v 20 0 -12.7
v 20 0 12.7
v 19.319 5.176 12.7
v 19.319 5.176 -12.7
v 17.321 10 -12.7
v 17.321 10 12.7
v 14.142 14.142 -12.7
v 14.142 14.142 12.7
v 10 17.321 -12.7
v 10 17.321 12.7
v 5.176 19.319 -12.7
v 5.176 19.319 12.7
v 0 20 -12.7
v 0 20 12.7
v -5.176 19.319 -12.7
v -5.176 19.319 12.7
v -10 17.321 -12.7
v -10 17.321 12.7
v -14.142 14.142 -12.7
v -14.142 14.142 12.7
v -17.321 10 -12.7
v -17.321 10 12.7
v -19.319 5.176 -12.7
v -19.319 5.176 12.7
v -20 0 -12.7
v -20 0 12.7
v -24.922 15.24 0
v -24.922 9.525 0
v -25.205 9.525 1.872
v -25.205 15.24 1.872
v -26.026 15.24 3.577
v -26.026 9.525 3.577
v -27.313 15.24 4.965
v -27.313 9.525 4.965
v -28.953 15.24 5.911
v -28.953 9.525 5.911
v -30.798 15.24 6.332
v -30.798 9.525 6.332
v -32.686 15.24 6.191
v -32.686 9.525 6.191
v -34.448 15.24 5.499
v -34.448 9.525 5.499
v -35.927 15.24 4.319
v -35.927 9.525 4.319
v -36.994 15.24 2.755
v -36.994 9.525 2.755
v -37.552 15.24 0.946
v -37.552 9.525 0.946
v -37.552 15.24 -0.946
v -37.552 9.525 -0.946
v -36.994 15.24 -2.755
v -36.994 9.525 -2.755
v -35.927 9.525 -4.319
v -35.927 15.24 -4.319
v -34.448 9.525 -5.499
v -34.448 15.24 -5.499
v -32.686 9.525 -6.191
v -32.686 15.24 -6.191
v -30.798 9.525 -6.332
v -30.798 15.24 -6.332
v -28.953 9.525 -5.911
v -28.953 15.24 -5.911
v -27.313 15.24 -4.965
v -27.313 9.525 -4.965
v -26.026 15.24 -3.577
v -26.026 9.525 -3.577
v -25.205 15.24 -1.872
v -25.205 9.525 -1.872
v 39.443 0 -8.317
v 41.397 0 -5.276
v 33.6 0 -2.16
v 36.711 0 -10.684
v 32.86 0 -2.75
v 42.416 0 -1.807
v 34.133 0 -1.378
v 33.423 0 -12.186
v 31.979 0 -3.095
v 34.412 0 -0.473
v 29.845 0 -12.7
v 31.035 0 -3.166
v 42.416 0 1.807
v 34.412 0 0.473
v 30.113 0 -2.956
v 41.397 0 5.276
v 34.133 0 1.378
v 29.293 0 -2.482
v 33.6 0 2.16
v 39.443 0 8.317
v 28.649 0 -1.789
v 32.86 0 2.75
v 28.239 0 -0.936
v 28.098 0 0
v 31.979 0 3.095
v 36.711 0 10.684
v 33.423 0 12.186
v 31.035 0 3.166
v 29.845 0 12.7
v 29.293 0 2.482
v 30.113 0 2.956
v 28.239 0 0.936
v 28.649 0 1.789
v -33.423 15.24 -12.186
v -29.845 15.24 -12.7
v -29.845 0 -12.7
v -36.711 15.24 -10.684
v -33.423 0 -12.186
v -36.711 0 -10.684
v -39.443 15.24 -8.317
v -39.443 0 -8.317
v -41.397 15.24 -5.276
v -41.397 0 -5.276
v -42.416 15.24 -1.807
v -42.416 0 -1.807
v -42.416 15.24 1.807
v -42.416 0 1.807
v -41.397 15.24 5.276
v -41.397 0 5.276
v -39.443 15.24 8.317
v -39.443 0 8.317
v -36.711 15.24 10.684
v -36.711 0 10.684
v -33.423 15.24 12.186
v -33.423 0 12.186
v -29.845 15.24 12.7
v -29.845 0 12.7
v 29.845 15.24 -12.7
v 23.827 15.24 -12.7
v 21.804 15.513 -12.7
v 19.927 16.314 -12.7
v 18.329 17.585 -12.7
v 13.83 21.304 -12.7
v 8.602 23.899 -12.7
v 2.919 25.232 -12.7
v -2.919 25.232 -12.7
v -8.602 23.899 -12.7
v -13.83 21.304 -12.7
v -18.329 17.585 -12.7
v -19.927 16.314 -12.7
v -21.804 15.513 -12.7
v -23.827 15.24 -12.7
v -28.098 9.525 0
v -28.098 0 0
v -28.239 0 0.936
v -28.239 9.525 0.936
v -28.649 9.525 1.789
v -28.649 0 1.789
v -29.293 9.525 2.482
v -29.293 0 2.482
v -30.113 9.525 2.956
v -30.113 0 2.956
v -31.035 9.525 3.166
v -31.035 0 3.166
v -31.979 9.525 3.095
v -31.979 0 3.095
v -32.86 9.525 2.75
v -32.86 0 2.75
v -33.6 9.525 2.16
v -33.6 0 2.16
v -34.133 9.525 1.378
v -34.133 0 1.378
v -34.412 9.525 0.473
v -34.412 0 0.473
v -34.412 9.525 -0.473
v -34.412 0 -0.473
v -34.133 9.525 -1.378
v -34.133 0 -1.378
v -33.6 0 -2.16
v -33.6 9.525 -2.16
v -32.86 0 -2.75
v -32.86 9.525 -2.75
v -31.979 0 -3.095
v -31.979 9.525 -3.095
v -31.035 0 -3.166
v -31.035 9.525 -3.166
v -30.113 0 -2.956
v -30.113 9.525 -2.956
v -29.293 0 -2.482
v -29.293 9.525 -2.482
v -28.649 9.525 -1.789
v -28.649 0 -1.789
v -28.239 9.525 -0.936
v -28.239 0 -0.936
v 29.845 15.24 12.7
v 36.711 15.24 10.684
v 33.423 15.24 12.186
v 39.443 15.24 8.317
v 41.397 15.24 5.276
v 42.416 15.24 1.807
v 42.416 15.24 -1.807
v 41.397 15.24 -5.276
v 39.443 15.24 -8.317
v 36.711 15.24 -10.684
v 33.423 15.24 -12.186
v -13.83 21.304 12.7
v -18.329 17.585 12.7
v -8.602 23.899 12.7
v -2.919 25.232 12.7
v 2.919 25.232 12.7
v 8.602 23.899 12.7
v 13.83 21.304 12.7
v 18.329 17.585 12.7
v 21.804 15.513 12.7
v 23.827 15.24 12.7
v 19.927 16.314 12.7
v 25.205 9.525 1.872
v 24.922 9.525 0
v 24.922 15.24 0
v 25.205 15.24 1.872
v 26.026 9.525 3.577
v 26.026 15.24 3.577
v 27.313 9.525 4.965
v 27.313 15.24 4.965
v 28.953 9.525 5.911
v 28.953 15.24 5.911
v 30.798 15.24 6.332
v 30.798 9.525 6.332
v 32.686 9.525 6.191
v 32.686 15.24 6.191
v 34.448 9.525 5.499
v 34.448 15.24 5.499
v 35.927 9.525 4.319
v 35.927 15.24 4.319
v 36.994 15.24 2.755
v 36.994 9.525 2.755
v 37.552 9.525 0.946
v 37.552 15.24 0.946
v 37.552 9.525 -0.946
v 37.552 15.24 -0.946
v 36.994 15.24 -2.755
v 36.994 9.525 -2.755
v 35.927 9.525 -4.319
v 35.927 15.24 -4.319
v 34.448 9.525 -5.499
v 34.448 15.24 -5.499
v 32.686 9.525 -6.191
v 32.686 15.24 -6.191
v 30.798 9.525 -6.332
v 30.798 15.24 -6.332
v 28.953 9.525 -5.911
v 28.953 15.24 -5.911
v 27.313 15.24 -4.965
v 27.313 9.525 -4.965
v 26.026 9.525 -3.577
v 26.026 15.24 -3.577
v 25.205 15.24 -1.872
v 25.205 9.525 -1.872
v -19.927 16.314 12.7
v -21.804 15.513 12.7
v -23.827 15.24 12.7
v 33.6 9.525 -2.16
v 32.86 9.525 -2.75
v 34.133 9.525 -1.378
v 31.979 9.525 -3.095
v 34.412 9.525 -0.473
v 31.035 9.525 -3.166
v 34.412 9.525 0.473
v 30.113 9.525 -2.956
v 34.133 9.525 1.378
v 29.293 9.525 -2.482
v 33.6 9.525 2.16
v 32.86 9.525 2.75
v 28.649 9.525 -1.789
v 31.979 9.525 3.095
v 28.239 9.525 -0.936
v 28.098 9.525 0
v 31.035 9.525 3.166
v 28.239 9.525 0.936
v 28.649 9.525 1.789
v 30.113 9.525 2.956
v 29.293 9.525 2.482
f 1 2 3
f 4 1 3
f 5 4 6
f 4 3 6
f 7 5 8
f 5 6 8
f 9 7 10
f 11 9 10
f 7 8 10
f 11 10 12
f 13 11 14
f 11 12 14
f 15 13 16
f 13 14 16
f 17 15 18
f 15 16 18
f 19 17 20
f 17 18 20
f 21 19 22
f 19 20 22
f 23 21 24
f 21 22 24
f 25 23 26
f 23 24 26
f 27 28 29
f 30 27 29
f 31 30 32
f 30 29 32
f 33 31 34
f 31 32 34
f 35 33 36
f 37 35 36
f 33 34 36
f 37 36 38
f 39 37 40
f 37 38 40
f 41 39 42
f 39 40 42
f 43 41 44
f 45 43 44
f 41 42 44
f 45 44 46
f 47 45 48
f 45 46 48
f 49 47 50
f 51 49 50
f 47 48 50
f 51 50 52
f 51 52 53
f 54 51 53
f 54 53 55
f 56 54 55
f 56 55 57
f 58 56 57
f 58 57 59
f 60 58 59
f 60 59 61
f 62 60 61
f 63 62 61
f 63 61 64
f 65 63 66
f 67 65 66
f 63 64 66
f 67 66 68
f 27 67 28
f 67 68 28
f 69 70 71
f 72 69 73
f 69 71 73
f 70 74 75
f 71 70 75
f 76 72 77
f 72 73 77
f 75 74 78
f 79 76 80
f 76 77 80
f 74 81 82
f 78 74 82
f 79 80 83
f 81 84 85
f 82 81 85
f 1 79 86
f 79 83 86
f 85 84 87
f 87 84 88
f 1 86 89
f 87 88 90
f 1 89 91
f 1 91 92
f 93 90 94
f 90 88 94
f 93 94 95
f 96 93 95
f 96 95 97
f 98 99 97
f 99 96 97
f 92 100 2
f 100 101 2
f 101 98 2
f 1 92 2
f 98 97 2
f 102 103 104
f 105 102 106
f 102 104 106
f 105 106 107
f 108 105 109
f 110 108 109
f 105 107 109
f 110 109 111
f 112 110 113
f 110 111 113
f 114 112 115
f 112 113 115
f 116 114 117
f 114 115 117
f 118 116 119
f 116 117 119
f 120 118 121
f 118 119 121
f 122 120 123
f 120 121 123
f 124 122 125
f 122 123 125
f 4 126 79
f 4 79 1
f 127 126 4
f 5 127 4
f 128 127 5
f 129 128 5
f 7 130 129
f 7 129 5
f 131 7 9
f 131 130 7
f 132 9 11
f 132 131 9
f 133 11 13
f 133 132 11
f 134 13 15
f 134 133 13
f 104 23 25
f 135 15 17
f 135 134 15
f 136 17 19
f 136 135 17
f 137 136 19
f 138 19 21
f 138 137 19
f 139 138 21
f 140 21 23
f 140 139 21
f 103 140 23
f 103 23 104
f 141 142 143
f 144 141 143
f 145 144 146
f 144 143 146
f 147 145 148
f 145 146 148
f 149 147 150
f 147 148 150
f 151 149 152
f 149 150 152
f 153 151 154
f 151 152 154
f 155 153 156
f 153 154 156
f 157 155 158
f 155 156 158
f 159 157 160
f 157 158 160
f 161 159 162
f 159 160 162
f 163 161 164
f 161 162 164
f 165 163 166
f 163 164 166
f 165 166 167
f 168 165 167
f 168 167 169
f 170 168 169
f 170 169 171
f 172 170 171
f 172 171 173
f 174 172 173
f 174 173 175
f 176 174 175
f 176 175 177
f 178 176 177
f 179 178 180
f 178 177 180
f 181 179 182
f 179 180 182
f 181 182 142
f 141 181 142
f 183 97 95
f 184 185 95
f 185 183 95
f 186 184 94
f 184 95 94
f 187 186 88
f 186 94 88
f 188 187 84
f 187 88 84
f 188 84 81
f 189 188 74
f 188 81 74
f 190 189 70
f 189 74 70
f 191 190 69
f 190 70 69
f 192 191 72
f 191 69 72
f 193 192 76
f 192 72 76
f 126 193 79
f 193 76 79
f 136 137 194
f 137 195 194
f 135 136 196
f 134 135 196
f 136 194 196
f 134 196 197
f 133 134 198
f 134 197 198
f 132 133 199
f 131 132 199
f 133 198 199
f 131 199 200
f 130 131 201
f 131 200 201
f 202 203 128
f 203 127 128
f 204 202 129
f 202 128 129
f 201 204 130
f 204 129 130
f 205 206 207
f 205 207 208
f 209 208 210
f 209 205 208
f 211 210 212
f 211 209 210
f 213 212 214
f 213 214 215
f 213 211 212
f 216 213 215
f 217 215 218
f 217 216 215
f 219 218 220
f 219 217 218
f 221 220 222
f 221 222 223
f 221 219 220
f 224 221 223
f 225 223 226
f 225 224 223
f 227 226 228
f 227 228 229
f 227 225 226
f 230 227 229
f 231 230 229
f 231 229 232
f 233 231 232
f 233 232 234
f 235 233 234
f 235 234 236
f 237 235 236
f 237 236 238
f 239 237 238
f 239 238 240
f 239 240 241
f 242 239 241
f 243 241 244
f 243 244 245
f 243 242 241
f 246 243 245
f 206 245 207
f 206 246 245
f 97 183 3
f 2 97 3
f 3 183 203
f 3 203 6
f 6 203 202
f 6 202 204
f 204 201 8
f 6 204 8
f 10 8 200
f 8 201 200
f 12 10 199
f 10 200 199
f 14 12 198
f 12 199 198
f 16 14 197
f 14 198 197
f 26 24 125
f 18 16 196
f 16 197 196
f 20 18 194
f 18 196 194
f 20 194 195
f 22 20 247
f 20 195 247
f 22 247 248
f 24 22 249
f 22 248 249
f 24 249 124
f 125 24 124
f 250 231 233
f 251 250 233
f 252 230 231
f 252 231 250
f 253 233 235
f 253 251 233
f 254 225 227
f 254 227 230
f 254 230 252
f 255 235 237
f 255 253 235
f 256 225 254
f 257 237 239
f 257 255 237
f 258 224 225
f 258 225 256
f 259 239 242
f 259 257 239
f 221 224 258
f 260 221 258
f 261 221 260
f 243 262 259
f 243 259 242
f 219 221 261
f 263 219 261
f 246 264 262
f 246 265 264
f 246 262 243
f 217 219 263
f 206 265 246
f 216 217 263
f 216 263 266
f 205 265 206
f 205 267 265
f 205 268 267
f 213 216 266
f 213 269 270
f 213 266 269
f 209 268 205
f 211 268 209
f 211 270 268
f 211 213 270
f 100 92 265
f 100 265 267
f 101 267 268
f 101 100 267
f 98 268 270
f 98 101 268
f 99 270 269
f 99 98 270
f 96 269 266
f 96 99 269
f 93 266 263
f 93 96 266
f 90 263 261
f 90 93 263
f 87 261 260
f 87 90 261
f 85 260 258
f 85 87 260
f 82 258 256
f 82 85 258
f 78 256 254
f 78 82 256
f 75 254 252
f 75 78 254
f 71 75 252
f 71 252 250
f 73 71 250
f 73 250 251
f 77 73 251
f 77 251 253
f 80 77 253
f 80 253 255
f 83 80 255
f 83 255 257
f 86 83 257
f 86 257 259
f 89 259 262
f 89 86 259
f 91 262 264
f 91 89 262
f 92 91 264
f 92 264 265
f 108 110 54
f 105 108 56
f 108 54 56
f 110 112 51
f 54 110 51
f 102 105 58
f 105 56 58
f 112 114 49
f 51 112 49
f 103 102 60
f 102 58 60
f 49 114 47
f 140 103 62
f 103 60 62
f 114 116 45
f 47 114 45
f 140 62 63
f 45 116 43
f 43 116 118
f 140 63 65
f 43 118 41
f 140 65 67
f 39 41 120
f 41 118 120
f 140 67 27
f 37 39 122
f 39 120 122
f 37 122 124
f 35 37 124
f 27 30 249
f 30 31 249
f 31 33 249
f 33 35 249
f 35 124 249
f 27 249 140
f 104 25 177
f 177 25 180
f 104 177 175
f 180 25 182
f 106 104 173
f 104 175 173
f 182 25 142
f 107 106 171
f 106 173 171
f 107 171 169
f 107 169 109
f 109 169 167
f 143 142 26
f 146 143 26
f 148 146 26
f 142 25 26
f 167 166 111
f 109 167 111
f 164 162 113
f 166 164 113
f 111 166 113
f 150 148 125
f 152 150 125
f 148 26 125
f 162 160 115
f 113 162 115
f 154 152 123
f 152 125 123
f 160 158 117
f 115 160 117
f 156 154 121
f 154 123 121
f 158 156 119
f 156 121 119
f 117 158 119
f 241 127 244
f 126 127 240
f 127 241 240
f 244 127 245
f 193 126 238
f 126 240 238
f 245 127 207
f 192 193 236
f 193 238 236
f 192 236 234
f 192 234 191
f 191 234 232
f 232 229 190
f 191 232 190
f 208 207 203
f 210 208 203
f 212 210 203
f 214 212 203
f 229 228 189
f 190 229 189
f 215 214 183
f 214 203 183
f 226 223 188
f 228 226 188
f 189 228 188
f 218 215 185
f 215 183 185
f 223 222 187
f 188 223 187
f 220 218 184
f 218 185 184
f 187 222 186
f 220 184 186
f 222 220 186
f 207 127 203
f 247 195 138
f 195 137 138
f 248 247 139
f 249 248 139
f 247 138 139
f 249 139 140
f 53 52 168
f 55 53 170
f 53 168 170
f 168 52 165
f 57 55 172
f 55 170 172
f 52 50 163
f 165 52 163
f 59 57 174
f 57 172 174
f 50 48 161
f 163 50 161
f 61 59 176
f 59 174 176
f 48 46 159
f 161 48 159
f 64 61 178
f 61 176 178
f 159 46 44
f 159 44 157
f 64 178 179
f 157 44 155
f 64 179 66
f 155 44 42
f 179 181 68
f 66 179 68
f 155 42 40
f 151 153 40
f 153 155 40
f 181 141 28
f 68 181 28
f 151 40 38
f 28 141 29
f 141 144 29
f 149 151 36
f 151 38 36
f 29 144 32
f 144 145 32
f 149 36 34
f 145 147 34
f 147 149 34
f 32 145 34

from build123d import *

# Parameters (mm, degrees)
BOSS_EXTRUDE1_DEPTH = 12.7
FILLET1_R           = 7.62
FILLET2_R           = 7.62
SKETCH2_R           = 3.175
CUT_EXTRUDE1_DEPTH  = 9.525
SKETCH3_R           = 6.35
CUT_EXTRUDE2_DEPTH  = 5.715
SKETCH4_OUTSIDE_W   = 105.562
SKETCH4_OUTSIDE_H   = 45.872
CUT_EXTRUDE3_DEPTH  = 26.4


with BuildPart() as part:
    # Sketch1 → Boss-Extrude1 (new body, symmetric)
    with BuildSketch(Plane.XY):
        with BuildLine():
            Line((-42.545, 0), (-42.545, 15.24))
            Line((-42.545, 15.24), (-20.32, 15.24))
            ThreePointArc((-20.32, 15.24), (0, 25.4), (20.32, 15.24))
            Line((20.32, 15.24), (42.545, 15.24))
            Line((42.545, 15.24), (42.545, 0))
            Line((42.545, 0), (20, 0))
            ThreePointArc((20, 0), (0, 20), (-20, 0))
            Line((-20, 0), (-42.545, 0))
        make_face()
    extrude(amount=BOSS_EXTRUDE1_DEPTH, both=True)

    # Fillet1
    fillet1_edges = [part.edges().sort_by_distance(p)[0] for p in [
        (20.32, 15.24, 0),
    ]]
    fillet(fillet1_edges, radius=FILLET1_R)

    # Fillet2
    fillet2_edges = [part.edges().sort_by_distance(p)[0] for p in [
        (-20.32, 15.24, 0),
    ]]
    fillet(fillet2_edges, radius=FILLET2_R)

    # Sketch2 → Cut-Extrude1 (cut)
    with BuildSketch(Plane.XZ):
        with Locations((-31.2725, 0)):
            Circle(SKETCH2_R)
    cut_extrude1 = extrude(amount=-CUT_EXTRUDE1_DEPTH, mode=Mode.SUBTRACT)

    # Sketch3 → Cut-Extrude2 (cut)
    with BuildSketch(Plane.XZ.offset(-9.525)):
        with Locations((-31.2725, 0)):
            Circle(SKETCH3_R)
    cut_extrude2 = extrude(amount=-CUT_EXTRUDE2_DEPTH, mode=Mode.SUBTRACT)

    # Mirror1: Cut-Extrude1, Cut-Extrude2 across plane
    add(cut_extrude1.mirror(Plane(origin=(0, 0, 0), x_dir=(0, 0, 1), z_dir=(1, 0, 0))), mode=Mode.SUBTRACT)
    add(cut_extrude2.mirror(Plane(origin=(0, 0, 0), x_dir=(0, 0, 1), z_dir=(1, 0, 0))), mode=Mode.SUBTRACT)

    # Sketch4 outside → Cut-Extrude3 (cut, through all)
    with BuildSketch(Plane(origin=(0, 0, 0), x_dir=(1, 0, 0), z_dir=(0, 1, 0))):
        Rectangle(SKETCH4_OUTSIDE_W, SKETCH4_OUTSIDE_H)
        with BuildLine():
            Line((-29.845, -12.7), (29.845, -12.7))
            ThreePointArc((29.845, -12.7), (42.545, 0), (29.845, 12.7))
            Line((29.845, 12.7), (-29.845, 12.7))
            ThreePointArc((-29.845, 12.7), (-42.545, 0), (-29.845, -12.7))
        make_face(mode=Mode.SUBTRACT)
    extrude(amount=CUT_EXTRUDE3_DEPTH, mode=Mode.SUBTRACT)


solid = part.part
